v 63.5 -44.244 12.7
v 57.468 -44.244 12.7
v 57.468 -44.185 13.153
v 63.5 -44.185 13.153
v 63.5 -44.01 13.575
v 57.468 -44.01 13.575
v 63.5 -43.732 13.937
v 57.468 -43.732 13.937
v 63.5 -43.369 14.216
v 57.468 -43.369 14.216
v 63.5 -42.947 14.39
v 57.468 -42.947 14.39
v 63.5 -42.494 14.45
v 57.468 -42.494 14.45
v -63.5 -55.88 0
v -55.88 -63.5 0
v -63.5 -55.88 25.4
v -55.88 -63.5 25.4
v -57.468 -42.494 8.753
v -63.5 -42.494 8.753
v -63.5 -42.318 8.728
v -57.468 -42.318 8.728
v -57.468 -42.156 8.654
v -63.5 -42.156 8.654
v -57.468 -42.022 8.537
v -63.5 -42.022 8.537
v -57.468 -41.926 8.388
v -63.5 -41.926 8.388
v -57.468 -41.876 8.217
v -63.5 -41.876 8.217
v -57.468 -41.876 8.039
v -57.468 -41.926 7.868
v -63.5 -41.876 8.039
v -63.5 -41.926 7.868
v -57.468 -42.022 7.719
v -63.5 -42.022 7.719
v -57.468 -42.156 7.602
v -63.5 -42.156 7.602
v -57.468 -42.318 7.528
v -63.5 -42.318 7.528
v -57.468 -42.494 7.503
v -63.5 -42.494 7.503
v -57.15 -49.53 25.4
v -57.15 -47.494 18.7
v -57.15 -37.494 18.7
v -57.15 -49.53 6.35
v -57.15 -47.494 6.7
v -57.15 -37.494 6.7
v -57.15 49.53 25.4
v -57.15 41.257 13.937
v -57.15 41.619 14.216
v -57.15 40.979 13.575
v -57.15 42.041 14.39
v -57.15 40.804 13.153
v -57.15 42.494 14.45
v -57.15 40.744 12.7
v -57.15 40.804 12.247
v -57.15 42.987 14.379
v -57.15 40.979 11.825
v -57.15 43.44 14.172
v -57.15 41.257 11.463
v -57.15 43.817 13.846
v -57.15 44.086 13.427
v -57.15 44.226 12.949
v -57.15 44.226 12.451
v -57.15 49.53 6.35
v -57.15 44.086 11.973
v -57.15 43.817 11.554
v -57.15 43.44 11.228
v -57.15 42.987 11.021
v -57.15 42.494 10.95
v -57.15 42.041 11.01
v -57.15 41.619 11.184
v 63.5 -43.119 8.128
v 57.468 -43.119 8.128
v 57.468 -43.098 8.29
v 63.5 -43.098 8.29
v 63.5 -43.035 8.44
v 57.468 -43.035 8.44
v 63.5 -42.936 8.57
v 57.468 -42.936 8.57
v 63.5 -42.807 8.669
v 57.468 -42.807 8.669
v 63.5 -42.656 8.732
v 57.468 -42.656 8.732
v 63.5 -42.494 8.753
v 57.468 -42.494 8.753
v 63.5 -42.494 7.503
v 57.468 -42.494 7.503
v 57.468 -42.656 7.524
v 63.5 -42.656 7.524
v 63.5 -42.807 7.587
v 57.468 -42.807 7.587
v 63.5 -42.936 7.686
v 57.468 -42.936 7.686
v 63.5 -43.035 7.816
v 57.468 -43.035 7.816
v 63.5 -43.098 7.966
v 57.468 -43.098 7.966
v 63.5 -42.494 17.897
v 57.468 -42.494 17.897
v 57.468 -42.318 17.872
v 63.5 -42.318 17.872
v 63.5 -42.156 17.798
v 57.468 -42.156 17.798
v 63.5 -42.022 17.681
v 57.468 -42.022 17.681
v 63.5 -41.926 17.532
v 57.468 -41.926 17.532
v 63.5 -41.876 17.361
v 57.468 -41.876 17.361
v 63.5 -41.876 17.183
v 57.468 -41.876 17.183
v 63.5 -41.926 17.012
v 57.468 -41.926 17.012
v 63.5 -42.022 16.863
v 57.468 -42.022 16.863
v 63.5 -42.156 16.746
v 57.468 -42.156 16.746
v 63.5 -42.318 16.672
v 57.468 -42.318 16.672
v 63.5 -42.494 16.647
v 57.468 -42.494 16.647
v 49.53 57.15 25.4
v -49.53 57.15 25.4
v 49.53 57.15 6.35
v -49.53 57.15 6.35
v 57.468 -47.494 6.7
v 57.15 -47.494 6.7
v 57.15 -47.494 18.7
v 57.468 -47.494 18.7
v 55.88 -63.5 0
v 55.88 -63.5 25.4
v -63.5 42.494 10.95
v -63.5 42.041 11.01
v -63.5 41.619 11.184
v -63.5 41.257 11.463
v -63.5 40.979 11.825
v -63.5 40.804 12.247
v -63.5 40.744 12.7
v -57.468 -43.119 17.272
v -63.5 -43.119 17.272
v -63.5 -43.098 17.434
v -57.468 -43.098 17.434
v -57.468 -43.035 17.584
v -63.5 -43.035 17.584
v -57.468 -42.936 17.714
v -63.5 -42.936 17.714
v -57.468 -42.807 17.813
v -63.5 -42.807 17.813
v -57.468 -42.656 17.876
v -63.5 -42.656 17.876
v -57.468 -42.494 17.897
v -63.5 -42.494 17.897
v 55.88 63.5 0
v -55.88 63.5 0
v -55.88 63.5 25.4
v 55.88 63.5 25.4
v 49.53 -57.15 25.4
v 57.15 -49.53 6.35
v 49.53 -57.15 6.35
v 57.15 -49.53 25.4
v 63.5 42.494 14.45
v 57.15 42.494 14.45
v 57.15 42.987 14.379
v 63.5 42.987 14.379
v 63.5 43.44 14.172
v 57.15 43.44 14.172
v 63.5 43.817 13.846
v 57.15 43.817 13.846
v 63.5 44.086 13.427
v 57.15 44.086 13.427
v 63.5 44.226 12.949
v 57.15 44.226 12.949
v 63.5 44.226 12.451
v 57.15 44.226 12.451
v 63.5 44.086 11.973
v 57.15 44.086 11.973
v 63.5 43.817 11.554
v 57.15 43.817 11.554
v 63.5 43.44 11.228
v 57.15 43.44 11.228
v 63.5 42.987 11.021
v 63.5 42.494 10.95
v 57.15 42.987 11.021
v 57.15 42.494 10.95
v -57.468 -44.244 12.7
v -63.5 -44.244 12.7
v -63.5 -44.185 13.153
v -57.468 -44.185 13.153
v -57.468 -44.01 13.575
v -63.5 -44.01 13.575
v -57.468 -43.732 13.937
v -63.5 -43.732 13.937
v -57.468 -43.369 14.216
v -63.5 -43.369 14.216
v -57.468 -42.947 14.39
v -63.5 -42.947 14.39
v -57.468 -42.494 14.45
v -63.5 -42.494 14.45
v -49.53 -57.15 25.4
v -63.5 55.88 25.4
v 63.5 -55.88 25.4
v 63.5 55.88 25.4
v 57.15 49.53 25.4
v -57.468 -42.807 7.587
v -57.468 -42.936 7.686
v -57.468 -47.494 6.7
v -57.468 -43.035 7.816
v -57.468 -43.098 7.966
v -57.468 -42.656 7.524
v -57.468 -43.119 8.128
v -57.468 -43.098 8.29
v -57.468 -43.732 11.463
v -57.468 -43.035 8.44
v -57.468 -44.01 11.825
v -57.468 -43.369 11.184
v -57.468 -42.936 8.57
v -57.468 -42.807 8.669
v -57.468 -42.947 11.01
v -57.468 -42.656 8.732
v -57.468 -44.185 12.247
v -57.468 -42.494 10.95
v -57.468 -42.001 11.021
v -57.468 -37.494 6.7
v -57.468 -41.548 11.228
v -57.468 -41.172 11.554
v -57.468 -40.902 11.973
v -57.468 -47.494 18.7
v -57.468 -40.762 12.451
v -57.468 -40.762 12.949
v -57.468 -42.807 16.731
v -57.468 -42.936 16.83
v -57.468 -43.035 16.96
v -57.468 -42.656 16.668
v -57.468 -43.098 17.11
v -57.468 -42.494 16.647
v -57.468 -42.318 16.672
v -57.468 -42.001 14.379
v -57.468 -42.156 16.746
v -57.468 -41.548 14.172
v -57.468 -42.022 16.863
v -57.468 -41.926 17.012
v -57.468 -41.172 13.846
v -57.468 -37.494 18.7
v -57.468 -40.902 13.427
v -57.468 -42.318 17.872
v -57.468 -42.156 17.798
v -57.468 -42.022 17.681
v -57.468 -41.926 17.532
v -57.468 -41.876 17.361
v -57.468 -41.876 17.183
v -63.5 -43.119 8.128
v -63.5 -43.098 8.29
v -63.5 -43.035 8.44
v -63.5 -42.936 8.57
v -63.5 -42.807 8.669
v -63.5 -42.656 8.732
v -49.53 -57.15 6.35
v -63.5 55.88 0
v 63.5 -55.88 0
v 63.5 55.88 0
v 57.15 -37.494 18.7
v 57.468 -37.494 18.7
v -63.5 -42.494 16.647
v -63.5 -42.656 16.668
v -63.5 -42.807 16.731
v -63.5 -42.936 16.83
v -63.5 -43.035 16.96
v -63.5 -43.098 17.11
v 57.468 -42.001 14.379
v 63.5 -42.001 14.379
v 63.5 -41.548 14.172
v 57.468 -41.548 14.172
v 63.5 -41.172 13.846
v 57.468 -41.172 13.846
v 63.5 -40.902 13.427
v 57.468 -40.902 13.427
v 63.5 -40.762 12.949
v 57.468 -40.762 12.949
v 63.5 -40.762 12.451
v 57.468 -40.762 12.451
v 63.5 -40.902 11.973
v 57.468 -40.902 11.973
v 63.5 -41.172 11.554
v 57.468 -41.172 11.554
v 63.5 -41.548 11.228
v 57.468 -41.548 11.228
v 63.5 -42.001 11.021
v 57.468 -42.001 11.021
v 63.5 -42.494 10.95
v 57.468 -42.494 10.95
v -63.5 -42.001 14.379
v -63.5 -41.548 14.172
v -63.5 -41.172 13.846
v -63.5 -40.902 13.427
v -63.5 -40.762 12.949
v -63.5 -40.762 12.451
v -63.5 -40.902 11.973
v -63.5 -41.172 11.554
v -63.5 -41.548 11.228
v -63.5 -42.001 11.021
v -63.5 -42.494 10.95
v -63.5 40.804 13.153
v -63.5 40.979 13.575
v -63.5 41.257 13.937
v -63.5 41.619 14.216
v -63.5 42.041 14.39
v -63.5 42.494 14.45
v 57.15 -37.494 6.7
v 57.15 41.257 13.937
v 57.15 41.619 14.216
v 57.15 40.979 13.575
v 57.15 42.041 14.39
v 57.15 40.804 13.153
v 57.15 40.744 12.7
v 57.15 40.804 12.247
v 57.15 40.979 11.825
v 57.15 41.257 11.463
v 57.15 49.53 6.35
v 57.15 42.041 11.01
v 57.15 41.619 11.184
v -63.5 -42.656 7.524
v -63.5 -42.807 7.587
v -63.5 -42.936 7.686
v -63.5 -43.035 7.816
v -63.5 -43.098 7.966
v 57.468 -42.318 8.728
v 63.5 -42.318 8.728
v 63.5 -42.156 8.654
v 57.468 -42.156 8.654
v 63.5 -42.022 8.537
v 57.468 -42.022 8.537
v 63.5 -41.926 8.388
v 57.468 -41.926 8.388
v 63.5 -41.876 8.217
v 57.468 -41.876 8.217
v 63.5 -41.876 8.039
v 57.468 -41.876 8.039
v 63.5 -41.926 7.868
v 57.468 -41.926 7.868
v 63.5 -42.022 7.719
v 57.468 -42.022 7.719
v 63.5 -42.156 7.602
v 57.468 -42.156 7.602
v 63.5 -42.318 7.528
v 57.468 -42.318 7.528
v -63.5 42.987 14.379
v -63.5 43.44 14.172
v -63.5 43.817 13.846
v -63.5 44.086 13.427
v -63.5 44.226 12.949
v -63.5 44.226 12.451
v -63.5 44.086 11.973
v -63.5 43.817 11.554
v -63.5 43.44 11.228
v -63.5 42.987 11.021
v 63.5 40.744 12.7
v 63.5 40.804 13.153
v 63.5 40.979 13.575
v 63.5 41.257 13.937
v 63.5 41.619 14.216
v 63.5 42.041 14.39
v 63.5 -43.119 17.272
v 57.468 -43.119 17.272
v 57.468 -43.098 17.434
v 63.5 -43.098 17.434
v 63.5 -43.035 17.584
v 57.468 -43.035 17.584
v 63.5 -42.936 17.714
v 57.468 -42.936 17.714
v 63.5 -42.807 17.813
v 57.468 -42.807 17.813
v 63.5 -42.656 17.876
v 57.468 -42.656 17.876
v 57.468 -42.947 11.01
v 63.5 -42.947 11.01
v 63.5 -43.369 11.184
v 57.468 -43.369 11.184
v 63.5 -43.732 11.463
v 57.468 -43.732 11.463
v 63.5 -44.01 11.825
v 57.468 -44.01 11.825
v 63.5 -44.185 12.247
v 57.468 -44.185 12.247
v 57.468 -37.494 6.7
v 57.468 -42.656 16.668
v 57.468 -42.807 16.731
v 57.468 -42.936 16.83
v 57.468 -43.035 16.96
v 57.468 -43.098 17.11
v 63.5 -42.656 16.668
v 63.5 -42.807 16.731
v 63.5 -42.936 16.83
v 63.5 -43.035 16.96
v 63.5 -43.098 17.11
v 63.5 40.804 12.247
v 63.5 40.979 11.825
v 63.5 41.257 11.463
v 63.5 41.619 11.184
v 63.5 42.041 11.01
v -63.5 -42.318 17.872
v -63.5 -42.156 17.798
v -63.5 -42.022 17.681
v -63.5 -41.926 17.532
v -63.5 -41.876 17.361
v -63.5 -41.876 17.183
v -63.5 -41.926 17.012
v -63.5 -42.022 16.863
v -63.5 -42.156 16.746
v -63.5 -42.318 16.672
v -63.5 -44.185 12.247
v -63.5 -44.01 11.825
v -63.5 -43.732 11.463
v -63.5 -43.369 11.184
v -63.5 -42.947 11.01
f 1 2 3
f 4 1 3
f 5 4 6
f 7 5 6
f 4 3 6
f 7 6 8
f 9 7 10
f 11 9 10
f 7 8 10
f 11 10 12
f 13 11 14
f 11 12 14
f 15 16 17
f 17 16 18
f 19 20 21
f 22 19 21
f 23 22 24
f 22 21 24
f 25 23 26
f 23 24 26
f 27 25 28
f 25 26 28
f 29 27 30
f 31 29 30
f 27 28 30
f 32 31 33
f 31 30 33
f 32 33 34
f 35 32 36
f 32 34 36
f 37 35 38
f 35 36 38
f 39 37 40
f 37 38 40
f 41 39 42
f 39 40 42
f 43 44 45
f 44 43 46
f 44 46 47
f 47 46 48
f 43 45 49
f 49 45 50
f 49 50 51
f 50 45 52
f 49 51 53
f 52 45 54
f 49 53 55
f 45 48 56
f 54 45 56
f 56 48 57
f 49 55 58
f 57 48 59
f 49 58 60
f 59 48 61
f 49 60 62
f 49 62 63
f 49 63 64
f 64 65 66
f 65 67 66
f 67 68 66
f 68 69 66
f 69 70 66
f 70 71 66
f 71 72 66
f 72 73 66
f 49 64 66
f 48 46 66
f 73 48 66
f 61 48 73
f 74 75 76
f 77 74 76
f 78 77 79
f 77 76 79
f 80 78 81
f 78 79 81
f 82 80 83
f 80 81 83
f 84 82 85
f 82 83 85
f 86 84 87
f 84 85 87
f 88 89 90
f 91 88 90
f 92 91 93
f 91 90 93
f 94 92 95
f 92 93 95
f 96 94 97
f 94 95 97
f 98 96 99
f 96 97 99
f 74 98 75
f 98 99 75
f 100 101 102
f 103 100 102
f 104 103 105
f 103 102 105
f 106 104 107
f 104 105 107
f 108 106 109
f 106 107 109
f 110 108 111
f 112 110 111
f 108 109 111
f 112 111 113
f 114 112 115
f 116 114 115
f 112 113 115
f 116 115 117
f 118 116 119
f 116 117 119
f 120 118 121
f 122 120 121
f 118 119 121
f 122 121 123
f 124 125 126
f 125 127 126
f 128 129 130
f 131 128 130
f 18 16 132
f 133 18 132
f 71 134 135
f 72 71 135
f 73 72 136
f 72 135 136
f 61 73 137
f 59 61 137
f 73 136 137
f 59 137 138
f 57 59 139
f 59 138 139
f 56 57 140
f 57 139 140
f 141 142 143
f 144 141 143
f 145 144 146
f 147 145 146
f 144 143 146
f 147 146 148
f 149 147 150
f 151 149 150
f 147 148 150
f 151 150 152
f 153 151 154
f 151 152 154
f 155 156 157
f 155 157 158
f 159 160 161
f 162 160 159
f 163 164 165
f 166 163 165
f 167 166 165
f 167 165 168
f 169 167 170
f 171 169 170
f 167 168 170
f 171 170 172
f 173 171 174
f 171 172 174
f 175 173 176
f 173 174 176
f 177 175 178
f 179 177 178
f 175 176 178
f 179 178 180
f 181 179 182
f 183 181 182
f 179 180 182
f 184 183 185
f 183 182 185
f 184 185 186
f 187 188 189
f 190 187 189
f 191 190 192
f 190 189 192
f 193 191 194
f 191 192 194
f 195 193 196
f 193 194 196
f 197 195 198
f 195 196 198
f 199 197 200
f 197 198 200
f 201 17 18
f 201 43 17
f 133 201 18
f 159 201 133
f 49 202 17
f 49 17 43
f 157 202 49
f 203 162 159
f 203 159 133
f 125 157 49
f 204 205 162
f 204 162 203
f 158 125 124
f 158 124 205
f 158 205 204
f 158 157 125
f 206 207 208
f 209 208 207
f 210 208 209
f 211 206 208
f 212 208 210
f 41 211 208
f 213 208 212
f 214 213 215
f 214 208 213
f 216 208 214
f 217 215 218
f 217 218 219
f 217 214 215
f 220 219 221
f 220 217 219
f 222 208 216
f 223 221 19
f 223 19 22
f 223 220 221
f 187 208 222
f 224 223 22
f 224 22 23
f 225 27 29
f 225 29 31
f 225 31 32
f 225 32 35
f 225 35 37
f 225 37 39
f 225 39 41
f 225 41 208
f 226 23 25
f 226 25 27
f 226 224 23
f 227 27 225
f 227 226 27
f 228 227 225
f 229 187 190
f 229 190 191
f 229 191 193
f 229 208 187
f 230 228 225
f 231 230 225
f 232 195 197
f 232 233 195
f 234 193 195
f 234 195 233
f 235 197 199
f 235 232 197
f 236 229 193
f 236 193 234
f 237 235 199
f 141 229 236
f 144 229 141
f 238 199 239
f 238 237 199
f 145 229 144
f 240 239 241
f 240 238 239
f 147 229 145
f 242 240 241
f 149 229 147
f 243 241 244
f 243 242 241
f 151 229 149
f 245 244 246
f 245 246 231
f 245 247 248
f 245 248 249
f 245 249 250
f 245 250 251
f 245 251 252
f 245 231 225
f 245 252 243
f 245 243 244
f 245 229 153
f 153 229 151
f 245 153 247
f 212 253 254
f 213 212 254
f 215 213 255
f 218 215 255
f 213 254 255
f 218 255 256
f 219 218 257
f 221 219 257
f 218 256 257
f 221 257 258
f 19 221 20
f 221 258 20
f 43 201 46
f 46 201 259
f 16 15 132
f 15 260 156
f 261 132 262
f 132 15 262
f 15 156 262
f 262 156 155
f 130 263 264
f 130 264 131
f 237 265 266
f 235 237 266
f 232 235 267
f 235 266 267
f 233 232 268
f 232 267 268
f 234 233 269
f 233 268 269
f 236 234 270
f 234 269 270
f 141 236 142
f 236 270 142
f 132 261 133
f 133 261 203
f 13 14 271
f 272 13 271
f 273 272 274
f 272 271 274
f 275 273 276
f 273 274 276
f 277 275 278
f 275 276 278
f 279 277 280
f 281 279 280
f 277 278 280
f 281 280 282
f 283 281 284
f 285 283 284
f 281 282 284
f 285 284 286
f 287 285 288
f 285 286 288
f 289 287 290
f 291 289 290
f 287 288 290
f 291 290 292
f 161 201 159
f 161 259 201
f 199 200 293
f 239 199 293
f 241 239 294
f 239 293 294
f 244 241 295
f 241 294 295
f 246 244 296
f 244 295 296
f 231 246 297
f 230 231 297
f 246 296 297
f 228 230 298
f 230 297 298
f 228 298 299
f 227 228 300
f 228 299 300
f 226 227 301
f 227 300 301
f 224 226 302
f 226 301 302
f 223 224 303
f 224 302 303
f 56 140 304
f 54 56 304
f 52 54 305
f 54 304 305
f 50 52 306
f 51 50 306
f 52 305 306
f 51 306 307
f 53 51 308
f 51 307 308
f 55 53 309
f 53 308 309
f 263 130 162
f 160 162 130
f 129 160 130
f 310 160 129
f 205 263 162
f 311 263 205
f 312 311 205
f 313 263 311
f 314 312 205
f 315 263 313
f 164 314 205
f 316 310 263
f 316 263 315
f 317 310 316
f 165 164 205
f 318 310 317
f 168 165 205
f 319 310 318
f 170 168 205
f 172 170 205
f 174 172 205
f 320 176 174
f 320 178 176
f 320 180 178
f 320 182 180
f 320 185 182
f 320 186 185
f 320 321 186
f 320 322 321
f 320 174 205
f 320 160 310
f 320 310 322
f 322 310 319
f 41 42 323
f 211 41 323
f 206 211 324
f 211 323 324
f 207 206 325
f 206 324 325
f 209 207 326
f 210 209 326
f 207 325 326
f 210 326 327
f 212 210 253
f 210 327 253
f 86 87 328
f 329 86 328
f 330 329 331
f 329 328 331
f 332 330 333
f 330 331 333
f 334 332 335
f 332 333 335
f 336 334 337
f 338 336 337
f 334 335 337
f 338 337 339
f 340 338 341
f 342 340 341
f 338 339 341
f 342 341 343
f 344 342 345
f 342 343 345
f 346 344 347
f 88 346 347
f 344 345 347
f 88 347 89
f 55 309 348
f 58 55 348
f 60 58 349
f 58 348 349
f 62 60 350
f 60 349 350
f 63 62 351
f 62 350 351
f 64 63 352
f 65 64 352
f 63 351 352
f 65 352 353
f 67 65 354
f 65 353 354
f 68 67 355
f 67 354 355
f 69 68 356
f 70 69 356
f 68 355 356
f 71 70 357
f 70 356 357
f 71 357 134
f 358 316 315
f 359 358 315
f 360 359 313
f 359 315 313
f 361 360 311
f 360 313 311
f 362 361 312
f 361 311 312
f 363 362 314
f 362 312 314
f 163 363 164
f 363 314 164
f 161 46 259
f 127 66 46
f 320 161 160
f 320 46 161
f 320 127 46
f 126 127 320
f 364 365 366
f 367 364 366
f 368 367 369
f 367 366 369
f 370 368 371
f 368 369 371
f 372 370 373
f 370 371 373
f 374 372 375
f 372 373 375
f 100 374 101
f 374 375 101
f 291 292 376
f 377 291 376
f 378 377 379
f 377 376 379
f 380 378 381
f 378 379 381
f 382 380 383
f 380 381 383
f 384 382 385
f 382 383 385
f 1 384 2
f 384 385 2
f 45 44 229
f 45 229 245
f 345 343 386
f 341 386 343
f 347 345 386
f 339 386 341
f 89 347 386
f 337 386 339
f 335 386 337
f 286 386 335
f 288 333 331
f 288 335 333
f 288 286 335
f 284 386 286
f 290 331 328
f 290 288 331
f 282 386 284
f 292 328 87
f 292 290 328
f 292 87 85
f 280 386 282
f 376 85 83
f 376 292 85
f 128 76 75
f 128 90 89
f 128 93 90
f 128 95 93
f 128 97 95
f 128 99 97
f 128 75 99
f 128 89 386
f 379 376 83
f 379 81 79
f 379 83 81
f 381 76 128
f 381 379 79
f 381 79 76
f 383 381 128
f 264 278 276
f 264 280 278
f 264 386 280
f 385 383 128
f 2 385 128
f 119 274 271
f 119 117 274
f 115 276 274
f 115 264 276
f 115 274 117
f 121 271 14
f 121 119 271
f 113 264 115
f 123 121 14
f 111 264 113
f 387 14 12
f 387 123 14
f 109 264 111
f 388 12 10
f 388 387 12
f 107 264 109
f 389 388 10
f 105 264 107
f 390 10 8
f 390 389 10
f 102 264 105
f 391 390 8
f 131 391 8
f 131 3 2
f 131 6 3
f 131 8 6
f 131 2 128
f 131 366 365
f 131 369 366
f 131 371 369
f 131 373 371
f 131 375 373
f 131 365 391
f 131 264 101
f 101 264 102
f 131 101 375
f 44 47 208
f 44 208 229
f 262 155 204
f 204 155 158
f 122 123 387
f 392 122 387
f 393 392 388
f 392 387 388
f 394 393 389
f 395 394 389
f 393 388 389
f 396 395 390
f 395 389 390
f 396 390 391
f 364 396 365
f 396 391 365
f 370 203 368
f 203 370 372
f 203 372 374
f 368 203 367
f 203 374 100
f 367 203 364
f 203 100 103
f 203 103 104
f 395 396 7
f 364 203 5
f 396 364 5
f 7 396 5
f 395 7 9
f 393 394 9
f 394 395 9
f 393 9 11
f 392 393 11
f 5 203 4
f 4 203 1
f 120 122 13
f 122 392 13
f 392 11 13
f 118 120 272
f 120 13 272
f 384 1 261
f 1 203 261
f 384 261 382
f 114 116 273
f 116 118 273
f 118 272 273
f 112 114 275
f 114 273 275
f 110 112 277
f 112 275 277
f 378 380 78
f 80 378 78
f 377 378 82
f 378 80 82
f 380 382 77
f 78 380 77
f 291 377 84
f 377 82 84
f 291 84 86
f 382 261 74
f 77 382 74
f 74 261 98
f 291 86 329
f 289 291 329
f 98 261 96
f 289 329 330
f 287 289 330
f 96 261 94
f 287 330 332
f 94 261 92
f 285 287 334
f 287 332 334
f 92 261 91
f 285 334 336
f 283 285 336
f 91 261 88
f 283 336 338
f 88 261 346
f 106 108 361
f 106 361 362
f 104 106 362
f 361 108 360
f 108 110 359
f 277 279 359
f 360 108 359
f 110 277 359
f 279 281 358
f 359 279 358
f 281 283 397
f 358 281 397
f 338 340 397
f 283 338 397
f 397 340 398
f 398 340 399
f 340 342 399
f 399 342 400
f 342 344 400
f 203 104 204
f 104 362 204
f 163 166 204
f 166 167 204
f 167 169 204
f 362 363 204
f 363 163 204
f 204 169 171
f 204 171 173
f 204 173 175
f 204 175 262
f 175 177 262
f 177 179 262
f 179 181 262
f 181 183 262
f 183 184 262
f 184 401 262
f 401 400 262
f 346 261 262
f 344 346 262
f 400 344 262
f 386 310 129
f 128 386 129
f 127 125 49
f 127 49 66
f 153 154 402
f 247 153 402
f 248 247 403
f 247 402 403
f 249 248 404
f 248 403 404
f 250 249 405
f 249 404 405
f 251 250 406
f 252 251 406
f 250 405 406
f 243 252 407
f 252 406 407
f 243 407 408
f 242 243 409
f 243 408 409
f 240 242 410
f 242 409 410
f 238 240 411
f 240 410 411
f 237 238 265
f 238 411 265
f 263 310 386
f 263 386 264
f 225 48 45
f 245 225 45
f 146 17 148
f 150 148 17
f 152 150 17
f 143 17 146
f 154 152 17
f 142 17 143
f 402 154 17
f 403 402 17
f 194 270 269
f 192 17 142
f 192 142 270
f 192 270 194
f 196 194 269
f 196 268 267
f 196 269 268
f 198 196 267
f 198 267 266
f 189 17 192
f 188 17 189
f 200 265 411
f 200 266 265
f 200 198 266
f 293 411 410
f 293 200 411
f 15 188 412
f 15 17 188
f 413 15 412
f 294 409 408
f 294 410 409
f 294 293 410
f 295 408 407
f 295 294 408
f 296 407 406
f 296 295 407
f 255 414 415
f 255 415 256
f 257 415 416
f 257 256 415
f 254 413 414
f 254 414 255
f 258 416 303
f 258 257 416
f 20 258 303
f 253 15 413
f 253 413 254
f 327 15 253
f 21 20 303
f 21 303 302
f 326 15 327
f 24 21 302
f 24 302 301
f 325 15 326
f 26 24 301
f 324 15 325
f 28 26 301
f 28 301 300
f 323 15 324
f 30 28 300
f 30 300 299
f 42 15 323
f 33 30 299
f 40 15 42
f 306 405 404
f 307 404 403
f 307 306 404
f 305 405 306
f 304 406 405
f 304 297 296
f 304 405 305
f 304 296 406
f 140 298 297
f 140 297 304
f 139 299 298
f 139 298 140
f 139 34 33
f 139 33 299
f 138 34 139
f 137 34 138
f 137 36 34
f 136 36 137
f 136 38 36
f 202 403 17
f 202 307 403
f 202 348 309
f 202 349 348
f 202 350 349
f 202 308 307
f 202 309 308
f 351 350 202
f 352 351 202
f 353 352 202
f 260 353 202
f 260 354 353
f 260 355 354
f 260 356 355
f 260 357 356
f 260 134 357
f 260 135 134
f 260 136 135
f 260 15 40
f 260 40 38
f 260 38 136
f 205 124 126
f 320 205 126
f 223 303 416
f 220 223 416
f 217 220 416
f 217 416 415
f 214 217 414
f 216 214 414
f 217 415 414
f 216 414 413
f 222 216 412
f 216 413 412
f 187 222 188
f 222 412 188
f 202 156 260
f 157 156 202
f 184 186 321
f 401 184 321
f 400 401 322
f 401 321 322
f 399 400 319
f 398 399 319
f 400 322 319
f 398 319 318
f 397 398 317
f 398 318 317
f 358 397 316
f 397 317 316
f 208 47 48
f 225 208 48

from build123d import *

# Parameters (mm, degrees)
F0_W      = 127
F0_H      = 127
F1_DEPTH  = 25.4
F2_T      = -6.35
F3_SIZE   = 7.62
F5_DEPTH  = 127.001
F6_W      = 10
F6_H      = 12
F7_DEPTH  = 0.3175
F8_W      = 10
F8_H      = 12
F9_DEPTH  = 0.3175
F11_DEPTH = 127.001


with BuildPart() as f1:
    # F0 (on Top) → F1 (new body)
    with BuildSketch(Plane.XY):
        Rectangle(F0_W, F0_H)
    extrude(amount=F1_DEPTH)

    # F2
    f2_openings = [f1.faces().sort_by_distance(p)[0] for p in [
        (0, 0, 25.4),
    ]]
    offset(amount=F2_T, openings=f2_openings)

    # F3
    f3_edges = [f1.edges().sort_by_distance(p)[0] for p in [
        (-63.5, -63.5, 12.7),
        (63.5, -63.5, 12.7),
        (63.5, 63.5, 12.7),
        (-63.5, 63.5, 12.7),
        (-57.15, 57.15, 15.875),
        (57.15, 57.15, 15.875),
        (57.15, -57.15, 15.875),
        (-57.15, -57.15, 15.875),
    ]]
    chamfer(f3_edges, length=F3_SIZE)

    # F4 (on face) → F5 (cut, through all)
    with BuildSketch(Plane(origin=(-63.5, 0, 0), x_dir=(0, -1, 0), z_dir=(-1, 0, 0))):
        with BuildLine():
            ThreePointArc((42.4942, 8.753), (41.8692, 8.128), (42.4942, 7.503))
            Line((42.4942, 7.503), (42.4942, 8.753))
        make_face()
        with BuildLine():
            ThreePointArc((42.4942, 17.897), (41.8692, 17.272), (42.4942, 16.647))
            Line((42.4942, 16.647), (42.4942, 17.897))
        make_face()
        with BuildLine():
            Line((42.4942, 17.897), (42.4942, 16.647))
            ThreePointArc((42.4942, 16.647), (42.9361417382, 16.8300582618), (43.1192, 17.272))
            ThreePointArc((43.1192, 17.272), (42.9361417382, 17.7139417382), (42.4942, 17.897))
        make_face()
        with BuildLine():
            ThreePointArc((42.4942, 14.45), (40.7442, 12.7), (42.4942, 10.95))
            Line((42.4942, 10.95), (42.4942, 12.7))
            Line((42.4942, 12.7), (42.4942, 14.45))
        make_face()
        with BuildLine():
            Line((42.4942, 12.7), (42.4942, 10.95))
            ThreePointArc((42.4942, 10.95), (43.7316368671, 11.4625631329), (44.2442, 12.7))
            Line((44.2442, 12.7), (42.4942, 12.7))
        make_face()
        with BuildLine():
            Line((42.4942, 8.753), (42.4942, 7.503))
            ThreePointArc((42.4942, 7.503), (42.9361417382, 7.6860582618), (43.1192, 8.128))
            ThreePointArc((43.1192, 8.128), (42.9361417382, 8.5699417382), (42.4942, 8.753))
        make_face()
        with BuildLine():
            Line((42.4942, 14.45), (42.4942, 12.7))
            Line((42.4942, 12.7), (44.2442, 12.7))
            ThreePointArc((44.2442, 12.7), (43.7316368671, 13.9374368671), (42.4942, 14.45))
        make_face()
    extrude(amount=-F5_DEPTH, mode=Mode.SUBTRACT)

    # F6 (on face) → F7 (cut)
    with BuildSketch(Plane.YZ.offset(-57.15)):
        with Locations((-42.4942, 12.7)):
            Rectangle(F6_W, F6_H)
    extrude(amount=-F7_DEPTH, mode=Mode.SUBTRACT)

    # F8 (on face) → F9 (cut)
    with BuildSketch(Plane(origin=(57.15, 0, 0), x_dir=(0, -1, 0), z_dir=(-1, 0, 0))):
        with Locations((42.4942, 12.7)):
            Rectangle(F8_W, F8_H)
    extrude(amount=-F9_DEPTH, mode=Mode.SUBTRACT)

    # F10 (on face) → F11 (cut, through all)
    with BuildSketch(Plane(origin=(-63.5, 0, 0), x_dir=(0, -1, 0), z_dir=(-1, 0, 0))):
        with BuildLine():
            ThreePointArc((-42.4942, 14.45), (-44.2442, 12.7), (-42.4942, 10.95))
            Line((-42.4942, 10.95), (-42.4942, 14.45))
        make_face()
        with BuildLine():
            Line((-42.4942, 14.45), (-42.4942, 10.95))
            ThreePointArc((-42.4942, 10.95), (-41.2567631329, 11.4625631329), (-40.7442, 12.7))
            ThreePointArc((-40.7442, 12.7), (-41.2567631329, 13.9374368671), (-42.4942, 14.45))
        make_face()
    extrude(amount=-F11_DEPTH, mode=Mode.SUBTRACT)


solid = f1.part
